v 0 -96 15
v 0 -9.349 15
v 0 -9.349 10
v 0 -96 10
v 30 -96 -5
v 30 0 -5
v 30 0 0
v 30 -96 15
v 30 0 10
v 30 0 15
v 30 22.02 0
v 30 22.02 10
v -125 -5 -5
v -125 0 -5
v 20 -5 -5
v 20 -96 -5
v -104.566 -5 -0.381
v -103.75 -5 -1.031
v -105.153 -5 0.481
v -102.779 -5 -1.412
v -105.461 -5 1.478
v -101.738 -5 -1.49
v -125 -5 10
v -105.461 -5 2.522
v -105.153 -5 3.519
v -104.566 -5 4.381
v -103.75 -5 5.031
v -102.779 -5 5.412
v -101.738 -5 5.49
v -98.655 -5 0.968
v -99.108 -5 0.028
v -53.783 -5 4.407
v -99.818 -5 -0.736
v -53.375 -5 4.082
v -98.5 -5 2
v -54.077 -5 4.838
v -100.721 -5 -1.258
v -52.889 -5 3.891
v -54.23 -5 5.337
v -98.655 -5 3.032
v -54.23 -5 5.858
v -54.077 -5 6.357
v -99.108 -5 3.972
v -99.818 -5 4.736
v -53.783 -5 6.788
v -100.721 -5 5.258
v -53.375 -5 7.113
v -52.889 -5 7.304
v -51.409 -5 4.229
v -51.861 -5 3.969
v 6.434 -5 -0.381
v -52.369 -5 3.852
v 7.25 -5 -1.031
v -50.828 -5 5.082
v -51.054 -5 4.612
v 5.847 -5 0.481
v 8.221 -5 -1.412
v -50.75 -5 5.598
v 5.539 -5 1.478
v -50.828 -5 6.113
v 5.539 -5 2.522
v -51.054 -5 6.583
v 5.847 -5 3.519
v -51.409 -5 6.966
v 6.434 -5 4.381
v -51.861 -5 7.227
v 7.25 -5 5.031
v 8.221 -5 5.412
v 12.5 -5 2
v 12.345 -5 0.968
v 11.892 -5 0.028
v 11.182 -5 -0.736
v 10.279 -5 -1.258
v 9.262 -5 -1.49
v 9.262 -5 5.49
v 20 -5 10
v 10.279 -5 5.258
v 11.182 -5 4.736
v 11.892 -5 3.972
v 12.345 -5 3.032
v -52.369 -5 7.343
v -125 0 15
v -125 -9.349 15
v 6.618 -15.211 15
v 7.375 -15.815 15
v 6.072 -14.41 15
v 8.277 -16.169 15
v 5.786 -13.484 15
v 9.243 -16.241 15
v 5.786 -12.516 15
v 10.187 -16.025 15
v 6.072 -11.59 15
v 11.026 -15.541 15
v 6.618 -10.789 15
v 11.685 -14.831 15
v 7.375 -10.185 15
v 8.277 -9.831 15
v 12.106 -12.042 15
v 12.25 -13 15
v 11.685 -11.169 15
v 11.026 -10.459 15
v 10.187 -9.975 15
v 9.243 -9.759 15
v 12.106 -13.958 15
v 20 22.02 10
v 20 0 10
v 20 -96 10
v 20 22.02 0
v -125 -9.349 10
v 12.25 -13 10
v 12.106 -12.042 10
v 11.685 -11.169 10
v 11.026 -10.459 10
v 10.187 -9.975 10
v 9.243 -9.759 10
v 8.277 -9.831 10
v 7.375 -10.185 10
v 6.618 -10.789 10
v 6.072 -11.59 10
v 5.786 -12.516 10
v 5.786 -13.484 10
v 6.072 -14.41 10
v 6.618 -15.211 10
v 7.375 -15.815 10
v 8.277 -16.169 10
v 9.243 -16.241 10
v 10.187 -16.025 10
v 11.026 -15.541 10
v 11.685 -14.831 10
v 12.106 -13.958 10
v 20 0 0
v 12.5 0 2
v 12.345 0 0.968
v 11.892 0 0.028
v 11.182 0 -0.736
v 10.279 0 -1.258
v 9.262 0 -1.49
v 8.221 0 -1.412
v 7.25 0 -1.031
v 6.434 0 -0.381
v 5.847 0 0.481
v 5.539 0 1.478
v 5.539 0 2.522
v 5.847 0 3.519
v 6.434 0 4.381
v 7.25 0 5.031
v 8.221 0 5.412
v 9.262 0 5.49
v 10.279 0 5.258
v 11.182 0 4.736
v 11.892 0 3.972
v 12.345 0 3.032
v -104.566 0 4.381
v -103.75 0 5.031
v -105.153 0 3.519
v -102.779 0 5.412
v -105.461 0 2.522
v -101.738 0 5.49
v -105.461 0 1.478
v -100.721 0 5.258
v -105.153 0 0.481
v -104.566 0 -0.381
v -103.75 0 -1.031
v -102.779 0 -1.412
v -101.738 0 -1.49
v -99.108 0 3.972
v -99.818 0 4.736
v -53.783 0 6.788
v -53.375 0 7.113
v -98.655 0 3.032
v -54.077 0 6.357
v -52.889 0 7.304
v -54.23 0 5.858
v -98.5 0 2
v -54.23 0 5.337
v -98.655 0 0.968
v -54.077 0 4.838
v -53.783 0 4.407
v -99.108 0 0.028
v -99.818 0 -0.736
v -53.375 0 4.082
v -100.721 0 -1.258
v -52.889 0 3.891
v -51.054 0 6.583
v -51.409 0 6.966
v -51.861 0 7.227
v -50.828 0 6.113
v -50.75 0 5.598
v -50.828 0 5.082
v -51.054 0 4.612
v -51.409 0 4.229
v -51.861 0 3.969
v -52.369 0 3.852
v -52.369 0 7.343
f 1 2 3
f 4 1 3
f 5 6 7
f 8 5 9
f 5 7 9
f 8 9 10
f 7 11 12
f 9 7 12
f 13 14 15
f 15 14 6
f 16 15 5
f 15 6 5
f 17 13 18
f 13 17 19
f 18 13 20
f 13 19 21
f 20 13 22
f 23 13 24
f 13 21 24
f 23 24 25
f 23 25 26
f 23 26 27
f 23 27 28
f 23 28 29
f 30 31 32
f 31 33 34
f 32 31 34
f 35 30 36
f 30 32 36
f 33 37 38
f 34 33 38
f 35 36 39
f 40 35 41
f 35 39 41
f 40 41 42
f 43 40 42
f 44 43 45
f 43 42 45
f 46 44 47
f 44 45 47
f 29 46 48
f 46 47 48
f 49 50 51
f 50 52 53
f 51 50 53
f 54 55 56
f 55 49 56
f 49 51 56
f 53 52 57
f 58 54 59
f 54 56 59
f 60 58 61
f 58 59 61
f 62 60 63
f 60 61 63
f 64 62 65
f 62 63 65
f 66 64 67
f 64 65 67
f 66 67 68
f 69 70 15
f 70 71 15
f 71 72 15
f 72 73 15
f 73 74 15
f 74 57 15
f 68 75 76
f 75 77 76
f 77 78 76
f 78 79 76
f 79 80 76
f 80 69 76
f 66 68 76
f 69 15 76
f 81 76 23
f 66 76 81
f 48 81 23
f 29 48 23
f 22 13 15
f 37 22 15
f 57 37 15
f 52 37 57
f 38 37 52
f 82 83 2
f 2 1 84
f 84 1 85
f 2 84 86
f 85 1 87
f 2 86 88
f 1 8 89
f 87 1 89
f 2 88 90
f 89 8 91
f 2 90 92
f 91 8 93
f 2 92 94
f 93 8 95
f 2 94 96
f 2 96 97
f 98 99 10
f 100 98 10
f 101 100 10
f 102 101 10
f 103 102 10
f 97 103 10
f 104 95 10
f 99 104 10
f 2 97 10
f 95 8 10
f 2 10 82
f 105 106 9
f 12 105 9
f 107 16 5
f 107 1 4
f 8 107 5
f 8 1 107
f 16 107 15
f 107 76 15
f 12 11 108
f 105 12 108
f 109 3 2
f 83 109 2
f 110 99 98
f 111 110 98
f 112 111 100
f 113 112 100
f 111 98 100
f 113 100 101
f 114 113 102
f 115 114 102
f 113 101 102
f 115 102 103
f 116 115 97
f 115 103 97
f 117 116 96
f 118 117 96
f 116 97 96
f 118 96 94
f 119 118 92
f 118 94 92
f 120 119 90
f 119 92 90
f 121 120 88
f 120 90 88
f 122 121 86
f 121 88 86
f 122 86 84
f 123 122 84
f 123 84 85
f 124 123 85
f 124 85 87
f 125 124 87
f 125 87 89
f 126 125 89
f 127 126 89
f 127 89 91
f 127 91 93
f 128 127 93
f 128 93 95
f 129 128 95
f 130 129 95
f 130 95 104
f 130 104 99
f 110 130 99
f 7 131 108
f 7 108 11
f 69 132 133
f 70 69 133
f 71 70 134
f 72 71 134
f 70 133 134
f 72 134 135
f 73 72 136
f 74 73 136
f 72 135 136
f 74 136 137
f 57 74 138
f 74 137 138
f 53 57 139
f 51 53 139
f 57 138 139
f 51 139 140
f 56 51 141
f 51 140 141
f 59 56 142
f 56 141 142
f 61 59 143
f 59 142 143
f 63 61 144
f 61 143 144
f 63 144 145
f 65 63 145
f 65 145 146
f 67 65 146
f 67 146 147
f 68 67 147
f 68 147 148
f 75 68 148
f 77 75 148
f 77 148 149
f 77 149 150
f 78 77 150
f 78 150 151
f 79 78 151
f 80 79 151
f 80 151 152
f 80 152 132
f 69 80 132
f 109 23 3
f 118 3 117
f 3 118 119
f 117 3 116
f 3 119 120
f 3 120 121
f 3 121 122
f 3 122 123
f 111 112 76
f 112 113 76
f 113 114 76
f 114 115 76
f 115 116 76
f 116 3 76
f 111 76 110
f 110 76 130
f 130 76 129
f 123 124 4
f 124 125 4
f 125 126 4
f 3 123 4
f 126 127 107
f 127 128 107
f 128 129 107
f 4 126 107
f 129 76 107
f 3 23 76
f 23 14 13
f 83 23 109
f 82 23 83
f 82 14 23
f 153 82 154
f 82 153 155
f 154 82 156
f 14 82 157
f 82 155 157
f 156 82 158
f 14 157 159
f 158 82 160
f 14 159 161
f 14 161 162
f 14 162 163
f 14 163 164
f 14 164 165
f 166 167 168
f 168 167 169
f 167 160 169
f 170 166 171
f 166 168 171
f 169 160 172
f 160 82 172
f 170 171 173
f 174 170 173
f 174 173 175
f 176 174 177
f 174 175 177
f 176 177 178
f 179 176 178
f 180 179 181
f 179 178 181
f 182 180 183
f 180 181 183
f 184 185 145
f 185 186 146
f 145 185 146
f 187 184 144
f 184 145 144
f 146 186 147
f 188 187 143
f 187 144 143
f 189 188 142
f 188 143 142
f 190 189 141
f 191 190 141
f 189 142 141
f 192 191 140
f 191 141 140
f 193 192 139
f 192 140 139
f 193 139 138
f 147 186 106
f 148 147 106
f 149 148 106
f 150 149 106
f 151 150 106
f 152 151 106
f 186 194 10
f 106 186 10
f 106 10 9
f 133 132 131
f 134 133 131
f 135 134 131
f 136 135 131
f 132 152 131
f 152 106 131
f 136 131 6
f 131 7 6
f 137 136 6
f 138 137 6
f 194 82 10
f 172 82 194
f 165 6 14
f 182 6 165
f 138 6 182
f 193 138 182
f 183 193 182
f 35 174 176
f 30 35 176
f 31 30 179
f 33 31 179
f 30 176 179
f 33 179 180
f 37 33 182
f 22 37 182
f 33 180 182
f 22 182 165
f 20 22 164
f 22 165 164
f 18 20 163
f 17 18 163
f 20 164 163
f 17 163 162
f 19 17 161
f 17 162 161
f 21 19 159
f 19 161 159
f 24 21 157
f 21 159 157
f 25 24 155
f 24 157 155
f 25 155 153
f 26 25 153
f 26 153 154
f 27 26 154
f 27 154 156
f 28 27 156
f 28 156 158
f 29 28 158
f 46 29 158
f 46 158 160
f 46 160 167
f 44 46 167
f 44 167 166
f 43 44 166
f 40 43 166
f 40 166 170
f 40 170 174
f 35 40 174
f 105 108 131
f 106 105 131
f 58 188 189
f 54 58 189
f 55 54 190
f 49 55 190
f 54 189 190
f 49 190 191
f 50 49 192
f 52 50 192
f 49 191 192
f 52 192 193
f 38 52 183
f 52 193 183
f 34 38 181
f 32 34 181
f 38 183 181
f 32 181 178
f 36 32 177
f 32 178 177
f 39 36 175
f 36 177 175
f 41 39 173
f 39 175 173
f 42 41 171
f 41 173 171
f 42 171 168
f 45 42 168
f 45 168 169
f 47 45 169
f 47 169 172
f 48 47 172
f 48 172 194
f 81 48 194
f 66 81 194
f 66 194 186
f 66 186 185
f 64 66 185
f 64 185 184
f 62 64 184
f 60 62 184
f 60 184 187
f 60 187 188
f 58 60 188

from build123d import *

# Parameters (mm, degrees)
BOSS_EXTRUDE3_DEPTH     = 10
SKETCH5_W               = 30
SKETCH5_H               = 25
BOSS_EXTRUDE5_DEPTH     = 5
BOSS_EXTRUDE7_DEPTH     = 5
BOSS_EXTRUDE8_DEPTH     = 71
BOSS_EXTRUDE9_DEPTH     = 125
SKETCH12_R              = 3.25
CUT_EXTRUDE1_DEPTH      = 6
CUT_EXTRUDE1_DEPTH_BACK = 15
SKETCH13_R              = 1.75
CUT_EXTRUDE2_DEPTH      = 5
CUT_EXTRUDE2_DEPTH_BACK = 15
SKETCH14_R              = 3.5
CUT_EXTRUDE3_DEPTH      = 10
SKETCH15_R              = 3.5
CUT_EXTRUDE4_DEPTH      = 10


with BuildPart() as part:
    # Sketch3 → Boss-Extrude3 (new body)
    with BuildSketch(Plane.XY):
        Polygon((0, 0), (0, -5), (20, -5), (20, -25), (30, -25), (30, 22.02), (20, 22.02), (20, 0), align=None)
    extrude(amount=BOSS_EXTRUDE3_DEPTH)

    # Sketch5 → Boss-Extrude5 (add)
    with BuildSketch(Plane.XY.offset(10)):
        with Locations((15, -12.5)):
            Rectangle(SKETCH5_W, SKETCH5_H)
    extrude(amount=BOSS_EXTRUDE5_DEPTH)

    # Sketch7 → Boss-Extrude7 (add)
    with BuildSketch(Plane(origin=(0, 0, 0), x_dir=(-1, 0, 0), z_dir=(0, 0, -1))):
        Polygon((0, 0), (-20, 0), (-20.758888401, 0), (-30, 0), (-30, -25), (-20, -25), (-20, -5), (0, -5), align=None)
    extrude(amount=BOSS_EXTRUDE7_DEPTH)

    # Sketch10 → Boss-Extrude8 (add)
    with BuildSketch(Plane.XZ.offset(25)):
        Polygon((0, 10), (20, 10), (20, -5), (30, -5), (30, 15), (0, 15), align=None)
    extrude(amount=BOSS_EXTRUDE8_DEPTH)

    # Sketch11 → Boss-Extrude9 (add)
    with BuildSketch(Plane.ZY):
        Polygon((10, 0), (-5, 0), (-5, -5), (10, -5), (10, -9.348527433), (15, -9.348527433), (15, -5), (15, 0), align=None)
    extrude(amount=BOSS_EXTRUDE9_DEPTH)

    # Sketch12 → Cut-Extrude1 (cut, two sides)
    with BuildSketch(Plane.XY.offset(15)) as cut_extrude1_sk:
        with Locations((9, -13)):
            Circle(SKETCH12_R)
    extrude(amount=CUT_EXTRUDE1_DEPTH, mode=Mode.SUBTRACT)
    extrude(cut_extrude1_sk.sketch, amount=-CUT_EXTRUDE1_DEPTH_BACK, mode=Mode.SUBTRACT)

    # Sketch13 → Cut-Extrude2 (cut, two sides)
    with BuildSketch(Plane(origin=(0, 0, 0), x_dir=(1, 0, 0), z_dir=(0, 1, 0))) as cut_extrude2_sk:
        with Locations((-52.5, -5.597603222)):
            Circle(SKETCH13_R)
    extrude(amount=CUT_EXTRUDE2_DEPTH, mode=Mode.SUBTRACT)
    extrude(cut_extrude2_sk.sketch, amount=-CUT_EXTRUDE2_DEPTH_BACK, mode=Mode.SUBTRACT)

    # Sketch14 → Cut-Extrude3 (cut)
    with BuildSketch(Plane(origin=(0, 0, 0), x_dir=(1, 0, 0), z_dir=(0, 1, 0))):
        with Locations((-102, -2)):
            Circle(SKETCH14_R)
    extrude(amount=-CUT_EXTRUDE3_DEPTH, mode=Mode.SUBTRACT)

    # Sketch15 → Cut-Extrude4 (cut)
    with BuildSketch(Plane(origin=(0, 0, 0), x_dir=(1, 0, 0), z_dir=(0, 1, 0))):
        with Locations((9, -2)):
            Circle(SKETCH15_R)
    extrude(amount=-CUT_EXTRUDE4_DEPTH, mode=Mode.SUBTRACT)


solid = part.part
